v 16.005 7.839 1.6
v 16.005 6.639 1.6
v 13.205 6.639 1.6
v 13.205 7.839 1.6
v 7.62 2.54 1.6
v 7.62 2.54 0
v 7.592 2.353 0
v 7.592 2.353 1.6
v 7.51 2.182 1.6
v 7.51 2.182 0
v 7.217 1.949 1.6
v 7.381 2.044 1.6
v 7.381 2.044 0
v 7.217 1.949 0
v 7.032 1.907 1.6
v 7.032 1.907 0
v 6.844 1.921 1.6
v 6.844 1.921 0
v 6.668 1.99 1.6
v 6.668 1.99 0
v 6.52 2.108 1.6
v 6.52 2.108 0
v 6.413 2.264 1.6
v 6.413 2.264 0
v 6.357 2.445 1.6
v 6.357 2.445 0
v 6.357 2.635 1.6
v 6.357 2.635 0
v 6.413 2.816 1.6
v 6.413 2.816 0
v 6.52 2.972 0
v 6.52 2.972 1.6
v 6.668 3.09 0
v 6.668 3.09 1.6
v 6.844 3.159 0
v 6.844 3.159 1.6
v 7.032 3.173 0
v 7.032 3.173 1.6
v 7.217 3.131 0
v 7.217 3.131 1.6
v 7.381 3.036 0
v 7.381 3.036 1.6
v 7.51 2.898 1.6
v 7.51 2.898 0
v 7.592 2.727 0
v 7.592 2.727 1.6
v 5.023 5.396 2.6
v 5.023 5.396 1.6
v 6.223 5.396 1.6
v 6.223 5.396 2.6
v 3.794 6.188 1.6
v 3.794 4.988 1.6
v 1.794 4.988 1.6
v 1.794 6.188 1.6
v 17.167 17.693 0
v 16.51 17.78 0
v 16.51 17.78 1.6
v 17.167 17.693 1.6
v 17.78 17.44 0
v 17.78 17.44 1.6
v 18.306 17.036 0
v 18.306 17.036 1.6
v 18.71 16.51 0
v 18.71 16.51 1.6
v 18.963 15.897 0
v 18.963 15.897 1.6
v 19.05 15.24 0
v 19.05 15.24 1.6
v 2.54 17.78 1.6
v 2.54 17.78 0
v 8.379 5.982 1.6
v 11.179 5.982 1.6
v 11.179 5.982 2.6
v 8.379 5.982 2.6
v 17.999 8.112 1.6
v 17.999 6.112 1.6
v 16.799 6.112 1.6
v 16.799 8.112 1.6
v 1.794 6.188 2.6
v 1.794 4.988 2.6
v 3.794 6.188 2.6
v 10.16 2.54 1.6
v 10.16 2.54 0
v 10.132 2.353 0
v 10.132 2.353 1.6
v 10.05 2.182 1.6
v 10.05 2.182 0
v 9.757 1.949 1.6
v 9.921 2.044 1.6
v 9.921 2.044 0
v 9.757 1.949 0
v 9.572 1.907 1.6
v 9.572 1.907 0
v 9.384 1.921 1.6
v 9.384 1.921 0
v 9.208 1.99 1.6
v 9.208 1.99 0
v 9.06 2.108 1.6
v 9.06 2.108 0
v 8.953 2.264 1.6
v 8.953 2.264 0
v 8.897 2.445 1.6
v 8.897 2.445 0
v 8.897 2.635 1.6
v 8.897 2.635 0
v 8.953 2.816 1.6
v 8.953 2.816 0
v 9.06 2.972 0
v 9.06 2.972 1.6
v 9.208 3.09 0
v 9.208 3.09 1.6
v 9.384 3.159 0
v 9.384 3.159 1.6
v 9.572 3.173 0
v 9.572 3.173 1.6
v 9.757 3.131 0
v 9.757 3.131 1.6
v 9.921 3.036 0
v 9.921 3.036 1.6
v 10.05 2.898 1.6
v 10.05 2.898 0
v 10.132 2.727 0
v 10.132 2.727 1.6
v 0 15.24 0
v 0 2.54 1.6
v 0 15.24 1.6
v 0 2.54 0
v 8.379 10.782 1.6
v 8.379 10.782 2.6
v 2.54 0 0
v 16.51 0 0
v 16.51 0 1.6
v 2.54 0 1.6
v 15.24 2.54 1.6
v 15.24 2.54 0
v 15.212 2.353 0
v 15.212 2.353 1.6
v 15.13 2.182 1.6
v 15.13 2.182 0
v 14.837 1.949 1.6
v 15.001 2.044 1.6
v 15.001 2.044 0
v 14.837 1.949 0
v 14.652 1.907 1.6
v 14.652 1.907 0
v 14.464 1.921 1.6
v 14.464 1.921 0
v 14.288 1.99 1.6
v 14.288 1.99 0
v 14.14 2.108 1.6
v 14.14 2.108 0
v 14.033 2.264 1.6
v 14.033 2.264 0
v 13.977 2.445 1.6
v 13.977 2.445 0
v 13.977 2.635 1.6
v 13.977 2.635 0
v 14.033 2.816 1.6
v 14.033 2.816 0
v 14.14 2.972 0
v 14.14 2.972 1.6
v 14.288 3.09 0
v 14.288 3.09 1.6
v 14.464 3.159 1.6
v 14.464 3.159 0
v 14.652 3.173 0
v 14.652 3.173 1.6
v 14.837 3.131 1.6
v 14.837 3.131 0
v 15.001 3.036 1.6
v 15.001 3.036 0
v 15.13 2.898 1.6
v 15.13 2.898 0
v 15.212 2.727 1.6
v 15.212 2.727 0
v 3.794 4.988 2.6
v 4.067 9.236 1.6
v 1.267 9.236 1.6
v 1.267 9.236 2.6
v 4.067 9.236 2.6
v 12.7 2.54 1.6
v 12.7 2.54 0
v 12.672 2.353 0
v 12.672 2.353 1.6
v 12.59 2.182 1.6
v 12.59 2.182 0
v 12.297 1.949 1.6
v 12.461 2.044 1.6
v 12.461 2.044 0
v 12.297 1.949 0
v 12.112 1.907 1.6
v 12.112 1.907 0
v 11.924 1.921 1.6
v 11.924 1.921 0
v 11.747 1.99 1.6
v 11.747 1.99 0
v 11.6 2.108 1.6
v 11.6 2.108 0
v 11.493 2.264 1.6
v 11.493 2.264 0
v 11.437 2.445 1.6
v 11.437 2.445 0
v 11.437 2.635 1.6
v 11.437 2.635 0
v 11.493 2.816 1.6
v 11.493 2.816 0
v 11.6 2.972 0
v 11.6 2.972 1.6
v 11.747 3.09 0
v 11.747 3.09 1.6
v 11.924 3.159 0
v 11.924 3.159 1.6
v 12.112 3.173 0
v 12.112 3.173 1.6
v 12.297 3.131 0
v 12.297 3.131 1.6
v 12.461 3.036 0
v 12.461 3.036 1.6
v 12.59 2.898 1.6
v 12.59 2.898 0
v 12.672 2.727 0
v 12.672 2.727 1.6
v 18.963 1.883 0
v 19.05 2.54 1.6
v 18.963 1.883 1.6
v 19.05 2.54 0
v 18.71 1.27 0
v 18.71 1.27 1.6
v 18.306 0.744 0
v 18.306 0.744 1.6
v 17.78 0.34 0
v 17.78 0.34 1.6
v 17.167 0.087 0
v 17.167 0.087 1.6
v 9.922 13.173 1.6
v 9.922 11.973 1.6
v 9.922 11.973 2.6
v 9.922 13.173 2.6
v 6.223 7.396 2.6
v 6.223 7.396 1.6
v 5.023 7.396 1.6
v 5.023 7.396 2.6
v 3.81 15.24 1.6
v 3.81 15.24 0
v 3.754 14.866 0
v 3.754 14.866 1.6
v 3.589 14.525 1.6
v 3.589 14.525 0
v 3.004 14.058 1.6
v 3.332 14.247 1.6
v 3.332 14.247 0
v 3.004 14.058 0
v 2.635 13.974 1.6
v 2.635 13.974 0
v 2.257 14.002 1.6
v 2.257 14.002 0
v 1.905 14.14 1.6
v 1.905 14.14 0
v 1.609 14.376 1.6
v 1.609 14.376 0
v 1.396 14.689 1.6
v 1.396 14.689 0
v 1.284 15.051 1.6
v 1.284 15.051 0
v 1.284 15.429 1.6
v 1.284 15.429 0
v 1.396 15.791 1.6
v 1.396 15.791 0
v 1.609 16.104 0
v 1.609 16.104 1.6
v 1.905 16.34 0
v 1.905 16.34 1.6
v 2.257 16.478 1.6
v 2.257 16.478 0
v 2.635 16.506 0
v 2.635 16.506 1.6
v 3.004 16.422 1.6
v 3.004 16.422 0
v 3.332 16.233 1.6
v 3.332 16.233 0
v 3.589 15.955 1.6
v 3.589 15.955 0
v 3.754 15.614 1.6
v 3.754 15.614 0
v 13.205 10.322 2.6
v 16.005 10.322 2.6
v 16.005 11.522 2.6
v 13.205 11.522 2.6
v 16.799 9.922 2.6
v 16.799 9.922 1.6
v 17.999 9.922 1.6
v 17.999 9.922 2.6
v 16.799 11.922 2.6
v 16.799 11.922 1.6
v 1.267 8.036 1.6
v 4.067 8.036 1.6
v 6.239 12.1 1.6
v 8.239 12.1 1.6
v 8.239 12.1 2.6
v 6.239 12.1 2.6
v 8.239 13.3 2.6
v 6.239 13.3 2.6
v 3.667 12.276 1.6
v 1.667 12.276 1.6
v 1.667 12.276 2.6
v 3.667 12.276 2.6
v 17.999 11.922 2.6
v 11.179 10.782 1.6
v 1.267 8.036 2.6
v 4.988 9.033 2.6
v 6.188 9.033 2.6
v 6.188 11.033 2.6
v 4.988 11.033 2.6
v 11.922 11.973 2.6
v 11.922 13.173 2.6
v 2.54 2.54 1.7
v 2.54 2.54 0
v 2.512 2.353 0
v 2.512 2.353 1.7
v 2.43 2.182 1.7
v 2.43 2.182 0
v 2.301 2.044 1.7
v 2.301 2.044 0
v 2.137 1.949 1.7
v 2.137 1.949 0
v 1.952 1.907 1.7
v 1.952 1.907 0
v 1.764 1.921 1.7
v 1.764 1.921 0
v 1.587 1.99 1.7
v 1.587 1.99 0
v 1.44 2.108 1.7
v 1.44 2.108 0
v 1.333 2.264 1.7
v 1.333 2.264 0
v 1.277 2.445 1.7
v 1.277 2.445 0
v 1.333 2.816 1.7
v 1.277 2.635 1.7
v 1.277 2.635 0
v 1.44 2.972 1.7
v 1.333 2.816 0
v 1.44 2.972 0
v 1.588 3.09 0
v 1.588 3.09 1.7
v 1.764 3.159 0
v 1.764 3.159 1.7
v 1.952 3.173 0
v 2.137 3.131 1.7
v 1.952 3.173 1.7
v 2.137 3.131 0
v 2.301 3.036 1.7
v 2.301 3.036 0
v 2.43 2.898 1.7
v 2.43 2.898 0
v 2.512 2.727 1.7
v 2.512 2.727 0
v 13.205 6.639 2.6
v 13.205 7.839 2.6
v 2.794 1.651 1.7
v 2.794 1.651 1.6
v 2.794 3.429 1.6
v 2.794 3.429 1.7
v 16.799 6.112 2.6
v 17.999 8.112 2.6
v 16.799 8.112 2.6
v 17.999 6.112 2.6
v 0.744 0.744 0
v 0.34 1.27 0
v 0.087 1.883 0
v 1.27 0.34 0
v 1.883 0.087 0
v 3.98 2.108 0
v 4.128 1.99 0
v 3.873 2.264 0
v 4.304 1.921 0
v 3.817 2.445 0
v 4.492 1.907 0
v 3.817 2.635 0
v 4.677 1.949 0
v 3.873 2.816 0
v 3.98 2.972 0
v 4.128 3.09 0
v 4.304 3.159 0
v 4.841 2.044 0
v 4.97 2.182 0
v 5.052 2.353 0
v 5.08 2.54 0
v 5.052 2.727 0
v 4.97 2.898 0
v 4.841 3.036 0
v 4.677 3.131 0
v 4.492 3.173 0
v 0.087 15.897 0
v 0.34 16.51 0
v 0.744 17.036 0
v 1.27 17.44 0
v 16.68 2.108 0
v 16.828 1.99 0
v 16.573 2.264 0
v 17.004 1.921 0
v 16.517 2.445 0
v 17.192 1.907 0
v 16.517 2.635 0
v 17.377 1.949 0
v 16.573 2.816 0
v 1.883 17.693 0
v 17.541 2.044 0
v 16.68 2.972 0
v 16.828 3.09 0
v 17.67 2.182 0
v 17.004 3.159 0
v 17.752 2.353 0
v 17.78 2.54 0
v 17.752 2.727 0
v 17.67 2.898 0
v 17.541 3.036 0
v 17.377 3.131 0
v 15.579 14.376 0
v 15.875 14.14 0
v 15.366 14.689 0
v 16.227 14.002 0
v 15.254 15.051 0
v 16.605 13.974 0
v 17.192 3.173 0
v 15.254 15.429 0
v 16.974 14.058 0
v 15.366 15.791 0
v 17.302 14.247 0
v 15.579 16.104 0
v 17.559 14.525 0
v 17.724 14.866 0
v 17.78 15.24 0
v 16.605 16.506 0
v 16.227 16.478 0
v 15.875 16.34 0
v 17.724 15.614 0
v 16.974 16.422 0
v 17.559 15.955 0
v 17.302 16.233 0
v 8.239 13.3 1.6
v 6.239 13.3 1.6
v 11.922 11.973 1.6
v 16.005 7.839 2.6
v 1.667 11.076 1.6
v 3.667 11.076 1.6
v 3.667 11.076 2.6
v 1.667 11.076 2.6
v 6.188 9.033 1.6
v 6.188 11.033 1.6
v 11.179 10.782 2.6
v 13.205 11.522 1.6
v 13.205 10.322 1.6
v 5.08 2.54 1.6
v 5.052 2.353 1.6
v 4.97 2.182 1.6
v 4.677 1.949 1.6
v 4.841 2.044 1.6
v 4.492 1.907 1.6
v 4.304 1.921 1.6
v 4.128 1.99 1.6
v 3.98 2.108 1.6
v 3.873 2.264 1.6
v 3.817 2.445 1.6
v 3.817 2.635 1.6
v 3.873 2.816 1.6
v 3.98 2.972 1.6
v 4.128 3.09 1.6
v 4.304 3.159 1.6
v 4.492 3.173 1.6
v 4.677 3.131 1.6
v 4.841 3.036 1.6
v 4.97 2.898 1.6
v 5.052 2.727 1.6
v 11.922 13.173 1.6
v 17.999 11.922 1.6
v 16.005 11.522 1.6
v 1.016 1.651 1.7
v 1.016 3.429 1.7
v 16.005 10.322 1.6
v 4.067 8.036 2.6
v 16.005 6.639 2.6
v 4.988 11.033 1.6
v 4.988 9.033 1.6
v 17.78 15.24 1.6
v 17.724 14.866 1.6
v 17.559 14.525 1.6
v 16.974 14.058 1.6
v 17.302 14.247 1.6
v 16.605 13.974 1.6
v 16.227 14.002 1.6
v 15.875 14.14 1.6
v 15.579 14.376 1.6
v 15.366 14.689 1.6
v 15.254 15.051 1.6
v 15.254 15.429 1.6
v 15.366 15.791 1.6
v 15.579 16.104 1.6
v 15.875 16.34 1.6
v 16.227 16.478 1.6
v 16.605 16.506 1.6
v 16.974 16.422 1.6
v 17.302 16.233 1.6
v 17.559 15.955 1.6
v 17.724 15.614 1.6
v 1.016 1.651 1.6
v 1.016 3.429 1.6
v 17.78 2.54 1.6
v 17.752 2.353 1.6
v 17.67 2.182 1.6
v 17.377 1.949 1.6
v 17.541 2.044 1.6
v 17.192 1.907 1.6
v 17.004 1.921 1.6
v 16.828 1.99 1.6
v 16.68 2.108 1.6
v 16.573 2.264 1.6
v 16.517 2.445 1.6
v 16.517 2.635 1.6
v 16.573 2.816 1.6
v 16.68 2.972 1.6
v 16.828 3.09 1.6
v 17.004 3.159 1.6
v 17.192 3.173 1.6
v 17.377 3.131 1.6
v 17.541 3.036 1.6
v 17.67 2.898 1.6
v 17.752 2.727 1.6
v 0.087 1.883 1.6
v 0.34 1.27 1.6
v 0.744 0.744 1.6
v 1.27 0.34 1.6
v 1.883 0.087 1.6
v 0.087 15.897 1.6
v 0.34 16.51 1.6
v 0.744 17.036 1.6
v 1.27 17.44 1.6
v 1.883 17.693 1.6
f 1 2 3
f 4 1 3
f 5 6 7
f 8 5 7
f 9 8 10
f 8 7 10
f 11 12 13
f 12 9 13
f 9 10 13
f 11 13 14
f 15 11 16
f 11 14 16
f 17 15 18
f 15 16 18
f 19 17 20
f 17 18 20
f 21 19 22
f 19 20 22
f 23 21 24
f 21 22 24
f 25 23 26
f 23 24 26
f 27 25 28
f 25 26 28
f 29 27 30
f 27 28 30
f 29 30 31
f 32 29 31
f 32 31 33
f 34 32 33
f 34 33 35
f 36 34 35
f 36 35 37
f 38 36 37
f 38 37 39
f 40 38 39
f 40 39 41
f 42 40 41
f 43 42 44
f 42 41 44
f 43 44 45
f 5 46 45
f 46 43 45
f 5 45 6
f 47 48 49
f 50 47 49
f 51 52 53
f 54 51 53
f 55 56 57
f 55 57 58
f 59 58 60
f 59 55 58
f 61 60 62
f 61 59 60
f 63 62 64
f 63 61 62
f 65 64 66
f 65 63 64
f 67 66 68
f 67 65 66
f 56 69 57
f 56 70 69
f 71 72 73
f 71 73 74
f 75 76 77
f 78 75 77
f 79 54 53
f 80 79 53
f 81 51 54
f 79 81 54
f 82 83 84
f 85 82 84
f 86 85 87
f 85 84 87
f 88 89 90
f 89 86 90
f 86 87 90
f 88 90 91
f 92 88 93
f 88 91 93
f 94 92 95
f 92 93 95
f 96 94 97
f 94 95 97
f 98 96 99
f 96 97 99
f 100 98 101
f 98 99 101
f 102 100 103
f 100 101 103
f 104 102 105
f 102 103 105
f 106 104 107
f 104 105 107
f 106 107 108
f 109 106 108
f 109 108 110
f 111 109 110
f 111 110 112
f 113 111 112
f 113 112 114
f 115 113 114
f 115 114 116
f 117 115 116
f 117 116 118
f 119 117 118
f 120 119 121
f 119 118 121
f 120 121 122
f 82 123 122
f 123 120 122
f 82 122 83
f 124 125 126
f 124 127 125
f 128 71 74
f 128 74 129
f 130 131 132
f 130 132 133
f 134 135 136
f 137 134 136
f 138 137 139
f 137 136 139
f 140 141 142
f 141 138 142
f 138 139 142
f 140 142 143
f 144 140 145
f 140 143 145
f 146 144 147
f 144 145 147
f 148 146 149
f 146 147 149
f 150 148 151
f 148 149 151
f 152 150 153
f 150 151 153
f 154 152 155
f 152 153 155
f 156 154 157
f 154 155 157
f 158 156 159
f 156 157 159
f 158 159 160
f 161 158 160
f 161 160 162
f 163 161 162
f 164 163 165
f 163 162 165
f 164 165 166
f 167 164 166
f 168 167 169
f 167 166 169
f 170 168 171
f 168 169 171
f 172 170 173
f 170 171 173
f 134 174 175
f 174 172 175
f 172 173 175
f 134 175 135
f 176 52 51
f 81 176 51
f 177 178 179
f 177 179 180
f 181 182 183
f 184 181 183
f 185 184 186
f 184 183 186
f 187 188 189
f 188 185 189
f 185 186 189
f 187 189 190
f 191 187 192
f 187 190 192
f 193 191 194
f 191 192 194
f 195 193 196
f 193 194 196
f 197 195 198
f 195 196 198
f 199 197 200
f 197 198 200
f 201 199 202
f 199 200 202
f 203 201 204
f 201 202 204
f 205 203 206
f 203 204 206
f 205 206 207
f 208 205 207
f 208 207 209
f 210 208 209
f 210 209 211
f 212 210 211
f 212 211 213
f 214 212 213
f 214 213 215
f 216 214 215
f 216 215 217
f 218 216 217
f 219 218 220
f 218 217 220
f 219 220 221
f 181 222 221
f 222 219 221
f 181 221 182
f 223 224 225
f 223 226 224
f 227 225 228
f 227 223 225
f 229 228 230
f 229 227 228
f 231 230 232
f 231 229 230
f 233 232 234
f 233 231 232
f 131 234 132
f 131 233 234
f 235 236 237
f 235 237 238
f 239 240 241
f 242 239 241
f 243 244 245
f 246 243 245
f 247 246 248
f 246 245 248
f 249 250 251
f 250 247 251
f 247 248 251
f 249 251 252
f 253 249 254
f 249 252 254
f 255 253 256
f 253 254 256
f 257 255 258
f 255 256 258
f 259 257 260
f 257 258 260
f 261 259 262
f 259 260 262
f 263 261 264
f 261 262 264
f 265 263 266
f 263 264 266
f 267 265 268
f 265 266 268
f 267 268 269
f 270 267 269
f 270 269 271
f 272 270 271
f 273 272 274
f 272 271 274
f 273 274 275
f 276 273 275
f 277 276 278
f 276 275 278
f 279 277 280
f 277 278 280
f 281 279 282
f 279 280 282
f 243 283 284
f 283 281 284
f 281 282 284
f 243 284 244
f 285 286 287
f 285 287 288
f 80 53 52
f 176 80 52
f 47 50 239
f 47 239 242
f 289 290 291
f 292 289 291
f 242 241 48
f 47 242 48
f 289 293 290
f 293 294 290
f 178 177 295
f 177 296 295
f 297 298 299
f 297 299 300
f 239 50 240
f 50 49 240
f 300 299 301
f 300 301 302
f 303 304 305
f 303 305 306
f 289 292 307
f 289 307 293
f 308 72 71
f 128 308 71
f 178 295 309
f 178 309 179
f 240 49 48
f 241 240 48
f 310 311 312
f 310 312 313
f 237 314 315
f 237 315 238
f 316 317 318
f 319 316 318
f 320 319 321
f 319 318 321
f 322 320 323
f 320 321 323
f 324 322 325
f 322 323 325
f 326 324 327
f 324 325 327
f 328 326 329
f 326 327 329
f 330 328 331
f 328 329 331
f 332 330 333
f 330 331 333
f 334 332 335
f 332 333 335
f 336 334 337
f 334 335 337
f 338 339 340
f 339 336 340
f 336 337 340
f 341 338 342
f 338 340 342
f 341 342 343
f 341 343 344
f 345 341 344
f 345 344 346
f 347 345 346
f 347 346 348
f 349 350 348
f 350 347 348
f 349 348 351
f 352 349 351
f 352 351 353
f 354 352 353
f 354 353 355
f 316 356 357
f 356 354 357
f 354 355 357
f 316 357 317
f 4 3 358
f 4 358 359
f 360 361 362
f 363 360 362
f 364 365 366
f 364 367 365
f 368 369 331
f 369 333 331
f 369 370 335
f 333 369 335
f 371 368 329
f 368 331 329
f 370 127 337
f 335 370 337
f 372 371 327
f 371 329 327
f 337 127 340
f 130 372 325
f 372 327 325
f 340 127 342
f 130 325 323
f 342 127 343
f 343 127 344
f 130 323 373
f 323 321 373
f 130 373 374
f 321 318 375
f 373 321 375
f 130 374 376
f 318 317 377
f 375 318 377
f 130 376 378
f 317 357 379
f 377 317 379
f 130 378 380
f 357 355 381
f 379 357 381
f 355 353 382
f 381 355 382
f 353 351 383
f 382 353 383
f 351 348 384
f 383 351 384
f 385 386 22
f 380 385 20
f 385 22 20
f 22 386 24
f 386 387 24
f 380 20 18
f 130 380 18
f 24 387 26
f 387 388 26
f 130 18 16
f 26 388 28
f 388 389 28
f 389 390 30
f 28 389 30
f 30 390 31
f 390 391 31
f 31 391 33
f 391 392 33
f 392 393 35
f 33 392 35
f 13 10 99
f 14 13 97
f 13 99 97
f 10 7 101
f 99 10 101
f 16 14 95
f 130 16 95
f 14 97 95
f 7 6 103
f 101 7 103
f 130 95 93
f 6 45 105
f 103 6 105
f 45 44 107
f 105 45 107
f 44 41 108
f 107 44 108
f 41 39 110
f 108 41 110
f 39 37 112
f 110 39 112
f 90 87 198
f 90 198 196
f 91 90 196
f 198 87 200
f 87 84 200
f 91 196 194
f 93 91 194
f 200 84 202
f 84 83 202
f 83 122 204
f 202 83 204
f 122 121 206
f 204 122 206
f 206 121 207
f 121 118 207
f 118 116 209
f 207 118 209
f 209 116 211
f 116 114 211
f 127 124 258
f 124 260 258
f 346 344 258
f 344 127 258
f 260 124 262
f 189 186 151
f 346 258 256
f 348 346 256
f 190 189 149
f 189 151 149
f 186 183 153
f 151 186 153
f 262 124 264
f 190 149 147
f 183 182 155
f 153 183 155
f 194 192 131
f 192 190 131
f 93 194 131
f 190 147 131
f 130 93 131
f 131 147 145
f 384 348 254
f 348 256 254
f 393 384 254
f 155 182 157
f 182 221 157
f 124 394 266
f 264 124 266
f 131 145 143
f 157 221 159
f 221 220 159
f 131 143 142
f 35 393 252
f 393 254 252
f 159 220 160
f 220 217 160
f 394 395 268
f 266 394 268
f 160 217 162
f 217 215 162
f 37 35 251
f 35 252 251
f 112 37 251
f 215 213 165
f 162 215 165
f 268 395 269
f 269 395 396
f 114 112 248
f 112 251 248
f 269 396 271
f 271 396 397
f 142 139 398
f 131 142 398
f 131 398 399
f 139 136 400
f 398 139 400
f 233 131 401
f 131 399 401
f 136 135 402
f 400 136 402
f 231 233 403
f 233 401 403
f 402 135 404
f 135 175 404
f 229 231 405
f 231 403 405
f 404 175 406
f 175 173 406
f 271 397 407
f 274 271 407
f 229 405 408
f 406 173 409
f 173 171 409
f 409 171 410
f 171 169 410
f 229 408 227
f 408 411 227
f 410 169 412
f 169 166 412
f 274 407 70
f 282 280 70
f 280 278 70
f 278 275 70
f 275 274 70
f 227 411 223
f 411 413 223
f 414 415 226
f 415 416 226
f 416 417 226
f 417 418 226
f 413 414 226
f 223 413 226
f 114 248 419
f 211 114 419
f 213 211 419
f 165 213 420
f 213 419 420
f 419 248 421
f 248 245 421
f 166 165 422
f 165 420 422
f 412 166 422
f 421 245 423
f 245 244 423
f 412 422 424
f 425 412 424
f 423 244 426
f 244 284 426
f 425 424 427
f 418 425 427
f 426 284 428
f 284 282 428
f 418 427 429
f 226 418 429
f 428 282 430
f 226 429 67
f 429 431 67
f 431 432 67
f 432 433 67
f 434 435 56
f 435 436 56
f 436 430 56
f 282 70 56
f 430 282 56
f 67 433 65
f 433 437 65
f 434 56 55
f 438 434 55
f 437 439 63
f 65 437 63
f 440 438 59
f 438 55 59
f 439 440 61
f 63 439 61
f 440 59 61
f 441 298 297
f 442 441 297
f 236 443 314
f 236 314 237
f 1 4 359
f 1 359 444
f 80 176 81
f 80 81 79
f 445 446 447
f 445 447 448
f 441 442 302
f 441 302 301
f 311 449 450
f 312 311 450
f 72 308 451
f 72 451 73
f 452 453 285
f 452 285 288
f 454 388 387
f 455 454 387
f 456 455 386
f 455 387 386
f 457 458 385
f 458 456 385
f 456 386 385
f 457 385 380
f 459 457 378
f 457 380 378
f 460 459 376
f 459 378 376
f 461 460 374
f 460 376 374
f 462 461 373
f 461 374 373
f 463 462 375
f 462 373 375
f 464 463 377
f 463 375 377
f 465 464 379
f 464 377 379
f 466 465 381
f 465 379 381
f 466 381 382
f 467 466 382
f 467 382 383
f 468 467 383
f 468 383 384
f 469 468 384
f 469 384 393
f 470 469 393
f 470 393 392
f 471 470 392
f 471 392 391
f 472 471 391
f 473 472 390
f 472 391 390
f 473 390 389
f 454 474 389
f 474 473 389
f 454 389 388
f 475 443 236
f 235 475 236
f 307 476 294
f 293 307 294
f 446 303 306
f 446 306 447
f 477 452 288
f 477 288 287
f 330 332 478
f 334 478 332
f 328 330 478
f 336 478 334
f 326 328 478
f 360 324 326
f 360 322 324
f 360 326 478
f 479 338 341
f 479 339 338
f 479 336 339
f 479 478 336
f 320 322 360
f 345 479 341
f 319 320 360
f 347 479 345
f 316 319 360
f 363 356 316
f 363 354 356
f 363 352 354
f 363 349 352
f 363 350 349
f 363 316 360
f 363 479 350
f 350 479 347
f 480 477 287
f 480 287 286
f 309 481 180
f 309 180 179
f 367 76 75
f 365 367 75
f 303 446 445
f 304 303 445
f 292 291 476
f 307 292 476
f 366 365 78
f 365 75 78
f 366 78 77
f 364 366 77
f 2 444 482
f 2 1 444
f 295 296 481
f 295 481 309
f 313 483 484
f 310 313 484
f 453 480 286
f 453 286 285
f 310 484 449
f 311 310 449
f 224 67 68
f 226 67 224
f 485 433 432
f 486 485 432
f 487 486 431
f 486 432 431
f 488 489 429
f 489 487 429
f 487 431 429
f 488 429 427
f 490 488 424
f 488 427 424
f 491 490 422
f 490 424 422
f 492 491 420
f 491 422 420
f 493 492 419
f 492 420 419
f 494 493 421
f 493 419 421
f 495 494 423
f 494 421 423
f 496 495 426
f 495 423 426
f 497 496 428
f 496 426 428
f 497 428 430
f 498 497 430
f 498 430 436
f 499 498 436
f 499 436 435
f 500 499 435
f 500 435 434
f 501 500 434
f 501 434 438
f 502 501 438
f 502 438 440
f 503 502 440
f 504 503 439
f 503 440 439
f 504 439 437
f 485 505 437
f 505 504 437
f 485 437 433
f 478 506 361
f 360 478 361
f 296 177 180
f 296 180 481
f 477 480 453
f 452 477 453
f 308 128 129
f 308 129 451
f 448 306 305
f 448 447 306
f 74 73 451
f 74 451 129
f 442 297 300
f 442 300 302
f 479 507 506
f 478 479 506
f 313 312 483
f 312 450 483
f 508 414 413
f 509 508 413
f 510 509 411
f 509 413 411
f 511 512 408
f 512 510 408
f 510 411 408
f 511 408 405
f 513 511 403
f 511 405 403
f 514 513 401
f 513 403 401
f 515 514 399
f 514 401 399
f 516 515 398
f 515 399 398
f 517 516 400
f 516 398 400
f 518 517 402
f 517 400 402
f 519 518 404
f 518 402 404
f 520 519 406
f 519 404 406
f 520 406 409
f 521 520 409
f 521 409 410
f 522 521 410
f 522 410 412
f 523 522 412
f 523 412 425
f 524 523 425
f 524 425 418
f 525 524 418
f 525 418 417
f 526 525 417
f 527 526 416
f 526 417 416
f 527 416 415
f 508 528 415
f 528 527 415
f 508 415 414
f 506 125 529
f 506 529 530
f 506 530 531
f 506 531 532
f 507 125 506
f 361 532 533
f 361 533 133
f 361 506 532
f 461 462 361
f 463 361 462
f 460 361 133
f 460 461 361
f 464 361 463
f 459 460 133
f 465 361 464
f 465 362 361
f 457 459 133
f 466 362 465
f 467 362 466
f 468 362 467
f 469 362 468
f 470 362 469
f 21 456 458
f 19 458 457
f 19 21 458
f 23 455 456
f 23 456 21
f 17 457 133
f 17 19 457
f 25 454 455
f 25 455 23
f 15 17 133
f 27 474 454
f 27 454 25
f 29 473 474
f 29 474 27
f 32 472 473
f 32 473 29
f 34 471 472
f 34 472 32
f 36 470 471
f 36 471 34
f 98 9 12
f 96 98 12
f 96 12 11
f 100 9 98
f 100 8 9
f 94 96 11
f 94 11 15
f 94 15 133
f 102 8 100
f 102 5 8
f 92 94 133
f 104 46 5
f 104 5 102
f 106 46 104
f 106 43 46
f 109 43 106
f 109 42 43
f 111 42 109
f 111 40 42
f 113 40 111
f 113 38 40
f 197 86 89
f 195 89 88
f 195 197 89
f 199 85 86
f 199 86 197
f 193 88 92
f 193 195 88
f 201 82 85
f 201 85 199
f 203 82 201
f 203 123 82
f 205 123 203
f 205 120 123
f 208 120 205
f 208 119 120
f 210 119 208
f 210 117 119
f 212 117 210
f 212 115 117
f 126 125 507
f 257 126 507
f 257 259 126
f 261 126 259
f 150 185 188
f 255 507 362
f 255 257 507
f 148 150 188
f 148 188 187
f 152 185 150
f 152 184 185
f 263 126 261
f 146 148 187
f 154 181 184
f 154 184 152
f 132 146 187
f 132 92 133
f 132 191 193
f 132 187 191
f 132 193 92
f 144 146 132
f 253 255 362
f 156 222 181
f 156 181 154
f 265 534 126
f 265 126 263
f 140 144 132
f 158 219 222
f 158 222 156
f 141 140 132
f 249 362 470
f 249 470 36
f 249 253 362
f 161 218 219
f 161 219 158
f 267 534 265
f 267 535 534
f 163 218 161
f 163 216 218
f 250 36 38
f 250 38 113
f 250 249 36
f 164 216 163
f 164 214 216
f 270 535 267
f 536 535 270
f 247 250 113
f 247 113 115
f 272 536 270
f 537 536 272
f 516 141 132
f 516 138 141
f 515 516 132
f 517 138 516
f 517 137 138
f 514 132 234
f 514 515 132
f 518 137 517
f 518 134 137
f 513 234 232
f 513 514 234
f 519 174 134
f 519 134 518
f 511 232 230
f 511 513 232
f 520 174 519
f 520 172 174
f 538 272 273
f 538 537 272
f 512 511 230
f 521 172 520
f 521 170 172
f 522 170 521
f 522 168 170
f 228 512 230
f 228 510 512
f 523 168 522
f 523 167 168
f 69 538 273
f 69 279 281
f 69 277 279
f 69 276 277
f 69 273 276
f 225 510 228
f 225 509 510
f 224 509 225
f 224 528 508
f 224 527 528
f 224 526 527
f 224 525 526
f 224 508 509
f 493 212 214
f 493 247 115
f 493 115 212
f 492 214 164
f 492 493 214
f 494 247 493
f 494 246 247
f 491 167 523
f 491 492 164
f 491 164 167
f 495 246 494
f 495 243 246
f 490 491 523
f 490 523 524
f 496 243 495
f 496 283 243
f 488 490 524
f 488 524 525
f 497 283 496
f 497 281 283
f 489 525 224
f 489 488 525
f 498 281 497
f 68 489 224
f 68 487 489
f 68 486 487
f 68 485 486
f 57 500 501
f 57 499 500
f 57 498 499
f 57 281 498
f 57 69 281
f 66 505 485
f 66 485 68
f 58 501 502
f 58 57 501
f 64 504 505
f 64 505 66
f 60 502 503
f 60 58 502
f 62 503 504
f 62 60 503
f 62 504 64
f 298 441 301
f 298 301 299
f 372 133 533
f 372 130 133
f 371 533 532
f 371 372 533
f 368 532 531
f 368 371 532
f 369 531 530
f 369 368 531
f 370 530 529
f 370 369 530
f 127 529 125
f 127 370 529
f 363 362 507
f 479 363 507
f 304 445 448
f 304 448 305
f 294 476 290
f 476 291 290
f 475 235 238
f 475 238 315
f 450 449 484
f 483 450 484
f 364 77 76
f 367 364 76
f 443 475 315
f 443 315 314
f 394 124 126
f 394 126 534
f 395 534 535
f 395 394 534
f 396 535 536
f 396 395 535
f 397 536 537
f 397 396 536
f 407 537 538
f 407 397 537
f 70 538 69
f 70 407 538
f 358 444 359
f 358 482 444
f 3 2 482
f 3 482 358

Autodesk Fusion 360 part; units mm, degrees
sketch "MPL3115A2_v0.2" plane through (0, 0, 0) normal (0, 0, 1) x (1, 0, 0)
  arc A0 (16.51, 0) -> (19.05, 2.54) centre (16.51, 2.54) ccw
  arc A1 (2.54, 17.78) -> (0, 15.24) centre (2.54, 15.24) ccw
  line L0 (19.05, 15.24) -> (19.05, 2.54)
  arc A2 (0, 2.54) -> (2.54, 0) centre (2.54, 2.54) ccw
  arc A3 (19.05, 15.24) -> (16.51, 17.78) centre (16.51, 15.24) ccw
  line L1 (2.54, 17.78) -> (16.51, 17.78)
  line L2 (0, 2.54) -> (0, 15.24)
  line L3 (16.51, 0) -> (2.54, 0)
  line L4 (1.016, 3.429) -> (1.016, 1.651)
  line L5 (1.016, 1.651) -> (2.794, 1.651)
  line L6 (2.794, 1.651) -> (2.794, 3.429)
  line L7 (1.016, 3.429) -> (1.016, 1.651)
  line L8 (1.016, 1.651) -> (2.794, 1.651)
  line L9 (2.794, 3.429) -> (1.016, 3.429)
  line L10 (2.794, 1.651) -> (2.794, 3.429)
  line L11 (2.794, 3.429) -> (1.016, 3.429)
  circle A4 centre (1.905, 2.54) radius 0.635
  circle A5 centre (4.445, 2.54) radius 0.635
  circle A6 centre (6.985, 2.54) radius 0.635
  circle A7 centre (9.525, 2.54) radius 0.635
  circle A8 centre (12.065, 2.54) radius 0.635
  circle A9 centre (14.605, 2.54) radius 0.635
  circle A10 centre (17.145, 2.54) radius 0.635
  circle A11 centre (2.54, 15.24) radius 1.27
  circle A12 centre (16.51, 15.24) radius 1.27
  dimension "d2" = 1.27
  dimension "d5" = 2.54
  dimension "d6" = 0
  dimension "d7" = 2.54
  dimension "d8" = 2.54
extrude "Extrude1" add sketch "MPL3115A2_v0.2" along normal blind 1.6 contours A0 A1 L0 A2 A3 L1 L2 L3 | L4 L5 L6 L7 L8 L9 L10 L11 makes body 1
extrude "Extrude2" add sketch "MPL3115A2_v0.2" along normal blind 0.1 from surface at 1.6 contours L4 L5 L6 L7 L8 L9 L10 L11 bodies 1
sketch "Sketch2" plane through (0, 0, 1.6) normal (0, 0, 1) x (-1, 0, 0)
  line L0 (-2.794, -1.651) -> (-1.016, -1.651)
  line L1 (-1.016, -1.651) -> (-1.016, -3.429)
  line L2 (-1.016, -3.429) -> (-2.794, -3.429)
  line L3 (-2.794, -3.429) -> (-2.794, -1.651)
  circle A0 centre (-17.145, -2.54) radius 0.635
  circle A1 centre (-16.51, -15.24) radius 1.27
  circle A2 centre (-9.525, -2.54) radius 0.635
  circle A3 centre (-12.065, -2.54) radius 0.635
  circle A4 centre (-2.54, -15.24) radius 1.27
  circle A5 centre (-4.445, -2.54) radius 0.635
  circle A6 centre (-14.605, -2.54) radius 0.635
  circle A7 centre (-6.985, -2.54) radius 0.635
  arc A8 (-19.05, -15.24) -> (-16.51, -17.78) centre (-16.51, -15.24) ccw
  line L4 (-16.51, -17.78) -> (-2.54, -17.78)
  arc A9 (-2.54, -17.78) -> (0, -15.24) centre (-2.54, -15.24) ccw
  line L5 (0, -15.24) -> (0, -2.54)
  arc A10 (0, -2.54) -> (-2.54, 0) centre (-2.54, -2.54) ccw
  line L6 (-2.54, 0) -> (-16.51, 0)
  arc A11 (-16.51, 0) -> (-19.05, -2.54) centre (-16.51, -2.54) ccw
  line L7 (-19.05, -2.54) -> (-19.05, -15.24)
  line L8 (-11.179, -5.982) -> (-8.379, -5.982)
  line L9 (-8.379, -5.982) -> (-8.379, -10.782)
  line L10 (-8.379, -10.782) -> (-11.179, -10.782)
  line L11 (-11.179, -10.782) -> (-11.179, -5.982)
  line L12 (-11.179, -5.982) -> (-8.379, -10.782) construction
  line L13 (-8.379, -5.982) -> (-11.179, -10.782) construction
  line L14 (-4.067, -8.036) -> (-1.267, -8.036)
  line L15 (-1.267, -8.036) -> (-1.267, -9.236)
  line L16 (-1.267, -9.236) -> (-4.067, -9.236)
  line L17 (-4.067, -9.236) -> (-4.067, -8.036)
  line L18 (-4.067, -8.036) -> (-1.267, -9.236) construction
  line L19 (-1.267, -8.036) -> (-4.067, -9.236) construction
  line L20 (-1.794, -4.988) -> (-3.794, -4.988)
  line L21 (-3.794, -4.988) -> (-3.794, -6.188)
  line L22 (-3.794, -6.188) -> (-1.794, -6.188)
  line L23 (-1.794, -6.188) -> (-1.794, -4.988)
  line L24 (-1.794, -4.988) -> (-3.794, -6.188) construction
  line L25 (-3.794, -4.988) -> (-1.794, -6.188) construction
  line L26 (-3.667, -11.076) -> (-1.667, -11.076)
  line L27 (-1.667, -11.076) -> (-1.667, -12.276)
  line L28 (-1.667, -12.276) -> (-3.667, -12.276)
  line L29 (-3.667, -12.276) -> (-3.667, -11.076)
  line L30 (-3.667, -11.076) -> (-1.667, -12.276) construction
  line L31 (-1.667, -11.076) -> (-3.667, -12.276) construction
  line L32 (-8.239, -12.1) -> (-6.239, -12.1)
  line L33 (-6.239, -12.1) -> (-6.239, -13.3)
  line L34 (-6.239, -13.3) -> (-8.239, -13.3)
  line L35 (-8.239, -13.3) -> (-8.239, -12.1)
  line L36 (-8.239, -12.1) -> (-6.239, -13.3) construction
  line L37 (-6.239, -12.1) -> (-8.239, -13.3) construction
  line L38 (-11.922, -11.973) -> (-9.922, -11.973)
  line L39 (-9.922, -11.973) -> (-9.922, -13.173)
  line L40 (-9.922, -13.173) -> (-11.922, -13.173)
  line L41 (-11.922, -13.173) -> (-11.922, -11.973)
  line L42 (-11.922, -11.973) -> (-9.922, -13.173) construction
  line L43 (-9.922, -11.973) -> (-11.922, -13.173) construction
  line L44 (-16.005, -10.322) -> (-13.205, -10.322)
  line L45 (-13.205, -10.322) -> (-13.205, -11.522)
  line L46 (-13.205, -11.522) -> (-16.005, -11.522)
  line L47 (-16.005, -11.522) -> (-16.005, -10.322)
  line L48 (-16.005, -10.322) -> (-13.205, -11.522) construction
  line L49 (-13.205, -10.322) -> (-16.005, -11.522) construction
  line L50 (-16.005, -6.639) -> (-13.205, -6.639)
  line L51 (-13.205, -6.639) -> (-13.205, -7.839)
  line L52 (-13.205, -7.839) -> (-16.005, -7.839)
  line L53 (-16.005, -7.839) -> (-16.005, -6.639)
  line L54 (-16.005, -6.639) -> (-13.205, -7.839) construction
  line L55 (-13.205, -6.639) -> (-16.005, -7.839) construction
  line L56 (-16.799, -9.922) -> (-17.999, -9.922)
  line L57 (-17.999, -9.922) -> (-17.999, -11.922)
  line L58 (-17.999, -11.922) -> (-16.799, -11.922)
  line L59 (-16.799, -11.922) -> (-16.799, -9.922)
  line L60 (-16.799, -9.922) -> (-17.999, -11.922) construction
  line L61 (-17.999, -9.922) -> (-16.799, -11.922) construction
  line L62 (-16.799, -6.112) -> (-17.999, -6.112)
  line L63 (-17.999, -6.112) -> (-17.999, -8.112)
  line L64 (-17.999, -8.112) -> (-16.799, -8.112)
  line L65 (-16.799, -8.112) -> (-16.799, -6.112)
  line L66 (-16.799, -6.112) -> (-17.999, -8.112) construction
  line L67 (-17.999, -6.112) -> (-16.799, -8.112) construction
  line L68 (-4.988, -9.033) -> (-6.188, -9.033)
  line L69 (-6.188, -9.033) -> (-6.188, -11.033)
  line L70 (-6.188, -11.033) -> (-4.988, -11.033)
  line L71 (-4.988, -11.033) -> (-4.988, -9.033)
  line L72 (-4.988, -9.033) -> (-6.188, -11.033) construction
  line L73 (-6.188, -9.033) -> (-4.988, -11.033) construction
  line L74 (-5.023, -5.396) -> (-6.223, -5.396)
  line L75 (-6.223, -5.396) -> (-6.223, -7.396)
  line L76 (-6.223, -7.396) -> (-5.023, -7.396)
  line L77 (-5.023, -7.396) -> (-5.023, -5.396)
  line L78 (-5.023, -5.396) -> (-6.223, -7.396) construction
  line L79 (-6.223, -5.396) -> (-5.023, -7.396) construction
  point P0 (-9.779, -8.382)
  point P1 (-2.667, -8.636)
  point P2 (-2.794, -5.588)
  point P3 (-2.667, -11.676)
  point P4 (-7.239, -12.7)
  point P5 (-10.922, -12.573)
  point P6 (-14.605, -10.922)
  point P7 (-14.605, -7.239)
  point P8 (-17.399, -10.922)
  point P9 (-17.399, -7.112)
  point P10 (-5.588, -10.033)
  point P11 (-5.623, -6.396)
  dimension "d19" = 4.8
  dimension "d20" = 2.8
  dimension "d21" = 8.382
  dimension "d22" = 9.779
  dimension "d23" = 2.8
  dimension "d24" = 1.2
  dimension "d25" = 2.667
  dimension "d26" = 8.636
  dimension "d27" = 2
  dimension "d28" = 1.2
  dimension "d29" = 2.794
  dimension "d30" = 5.588
  dimension "d31" = 2
  dimension "d32" = 1.2
  dimension "d33" = 2.667
  dimension "d34" = 11.676
  dimension "d35" = 2
  dimension "d36" = 1.2
  dimension "d37" = 12.7
  dimension "d38" = 7.239
  dimension "d39" = 1.2
  dimension "d40" = 2
  dimension "d41" = 12.573
  dimension "d42" = 10.922
  dimension "d43" = 2.8
  dimension "d44" = 1.2
  dimension "d45" = 2.8
  dimension "d46" = 1.2
  dimension "d47" = 2
  dimension "d48" = 1.2
  dimension "d49" = 2
  dimension "d50" = 1.2
  dimension "d51" = 10.922
  dimension "d52" = 14.605
  dimension "d53" = 7.239
  dimension "d54" = 14.605
  dimension "d55" = 10.922
  dimension "d56" = 17.399
  dimension "d57" = 7.112
  dimension "d58" = 17.399
  dimension "d66" = 2
  dimension "d67" = 1.2
  dimension "d68" = 2
  dimension "d69" = 1.2
  dimension "d70" = 5.588
  dimension "d71" = 10.033
  dimension "d72" = 5.623
  dimension "d73" = 6.396
extrude "Extrude3" add sketch "Sketch2" along normal blind 1 separate body contours L8 L9 L10 L11 | L14 L15 L16 L17 | L20 L21 L22 L23 | L26 L27 L28 L29 | L32 L33 L34 L35 | L38 L39 L40 L41 | L44 L45 L46 L47 | L50 L51 L52 L53 | L56 L57 L58 L59 | L62 L63 L64 L65 | L68 L69 L70 L71 | L74 L75 L76 L77 makes body 2 at (17.199, 7.4453, 1.6) makes body 3 at (11.2553, 12.773, 1.6) makes body 4 at (3.1273, 5.388, 1.6) makes body 5 at (3.1337, 8.436, 1.6) makes body 6 at (15.0717, 10.722, 1.6) makes body 7 at (5.823, 6.0627, 1.6) makes body 8 at (15.0717, 7.039, 1.6) makes body 9 at (7.5723, 12.5, 1.6) makes body 10 at (10.2457, 7.582, 1.6) makes body 11 at (3.0003, 11.876, 1.6) makes body 12 at (17.199, 11.2553, 1.6) makes body 13 at (5.788, 9.6997, 1.6)
sketch "Sketch3" plane through (0, 0, 2.6) normal (0, 0, 1) x (-1, 0, 0)
  line L0 (-11.179, -10.782) -> (-8.379, -10.782)
  line L1 (-8.379, -10.782) -> (-8.379, -5.982)
  line L2 (-8.379, -5.982) -> (-11.179, -5.982)
  line L3 (-11.179, -5.982) -> (-11.179, -10.782)
  circle A0 centre (-9.779, -6.782) radius 0.3
  dimension "d61" = 0.6
  dimension "d65" = 0.8
extrude "Extrude4" cut sketch "Sketch3" against normal blind 0.2 contours A0 bodies 8 4 1 6 2 12 11 5 3 9 10
